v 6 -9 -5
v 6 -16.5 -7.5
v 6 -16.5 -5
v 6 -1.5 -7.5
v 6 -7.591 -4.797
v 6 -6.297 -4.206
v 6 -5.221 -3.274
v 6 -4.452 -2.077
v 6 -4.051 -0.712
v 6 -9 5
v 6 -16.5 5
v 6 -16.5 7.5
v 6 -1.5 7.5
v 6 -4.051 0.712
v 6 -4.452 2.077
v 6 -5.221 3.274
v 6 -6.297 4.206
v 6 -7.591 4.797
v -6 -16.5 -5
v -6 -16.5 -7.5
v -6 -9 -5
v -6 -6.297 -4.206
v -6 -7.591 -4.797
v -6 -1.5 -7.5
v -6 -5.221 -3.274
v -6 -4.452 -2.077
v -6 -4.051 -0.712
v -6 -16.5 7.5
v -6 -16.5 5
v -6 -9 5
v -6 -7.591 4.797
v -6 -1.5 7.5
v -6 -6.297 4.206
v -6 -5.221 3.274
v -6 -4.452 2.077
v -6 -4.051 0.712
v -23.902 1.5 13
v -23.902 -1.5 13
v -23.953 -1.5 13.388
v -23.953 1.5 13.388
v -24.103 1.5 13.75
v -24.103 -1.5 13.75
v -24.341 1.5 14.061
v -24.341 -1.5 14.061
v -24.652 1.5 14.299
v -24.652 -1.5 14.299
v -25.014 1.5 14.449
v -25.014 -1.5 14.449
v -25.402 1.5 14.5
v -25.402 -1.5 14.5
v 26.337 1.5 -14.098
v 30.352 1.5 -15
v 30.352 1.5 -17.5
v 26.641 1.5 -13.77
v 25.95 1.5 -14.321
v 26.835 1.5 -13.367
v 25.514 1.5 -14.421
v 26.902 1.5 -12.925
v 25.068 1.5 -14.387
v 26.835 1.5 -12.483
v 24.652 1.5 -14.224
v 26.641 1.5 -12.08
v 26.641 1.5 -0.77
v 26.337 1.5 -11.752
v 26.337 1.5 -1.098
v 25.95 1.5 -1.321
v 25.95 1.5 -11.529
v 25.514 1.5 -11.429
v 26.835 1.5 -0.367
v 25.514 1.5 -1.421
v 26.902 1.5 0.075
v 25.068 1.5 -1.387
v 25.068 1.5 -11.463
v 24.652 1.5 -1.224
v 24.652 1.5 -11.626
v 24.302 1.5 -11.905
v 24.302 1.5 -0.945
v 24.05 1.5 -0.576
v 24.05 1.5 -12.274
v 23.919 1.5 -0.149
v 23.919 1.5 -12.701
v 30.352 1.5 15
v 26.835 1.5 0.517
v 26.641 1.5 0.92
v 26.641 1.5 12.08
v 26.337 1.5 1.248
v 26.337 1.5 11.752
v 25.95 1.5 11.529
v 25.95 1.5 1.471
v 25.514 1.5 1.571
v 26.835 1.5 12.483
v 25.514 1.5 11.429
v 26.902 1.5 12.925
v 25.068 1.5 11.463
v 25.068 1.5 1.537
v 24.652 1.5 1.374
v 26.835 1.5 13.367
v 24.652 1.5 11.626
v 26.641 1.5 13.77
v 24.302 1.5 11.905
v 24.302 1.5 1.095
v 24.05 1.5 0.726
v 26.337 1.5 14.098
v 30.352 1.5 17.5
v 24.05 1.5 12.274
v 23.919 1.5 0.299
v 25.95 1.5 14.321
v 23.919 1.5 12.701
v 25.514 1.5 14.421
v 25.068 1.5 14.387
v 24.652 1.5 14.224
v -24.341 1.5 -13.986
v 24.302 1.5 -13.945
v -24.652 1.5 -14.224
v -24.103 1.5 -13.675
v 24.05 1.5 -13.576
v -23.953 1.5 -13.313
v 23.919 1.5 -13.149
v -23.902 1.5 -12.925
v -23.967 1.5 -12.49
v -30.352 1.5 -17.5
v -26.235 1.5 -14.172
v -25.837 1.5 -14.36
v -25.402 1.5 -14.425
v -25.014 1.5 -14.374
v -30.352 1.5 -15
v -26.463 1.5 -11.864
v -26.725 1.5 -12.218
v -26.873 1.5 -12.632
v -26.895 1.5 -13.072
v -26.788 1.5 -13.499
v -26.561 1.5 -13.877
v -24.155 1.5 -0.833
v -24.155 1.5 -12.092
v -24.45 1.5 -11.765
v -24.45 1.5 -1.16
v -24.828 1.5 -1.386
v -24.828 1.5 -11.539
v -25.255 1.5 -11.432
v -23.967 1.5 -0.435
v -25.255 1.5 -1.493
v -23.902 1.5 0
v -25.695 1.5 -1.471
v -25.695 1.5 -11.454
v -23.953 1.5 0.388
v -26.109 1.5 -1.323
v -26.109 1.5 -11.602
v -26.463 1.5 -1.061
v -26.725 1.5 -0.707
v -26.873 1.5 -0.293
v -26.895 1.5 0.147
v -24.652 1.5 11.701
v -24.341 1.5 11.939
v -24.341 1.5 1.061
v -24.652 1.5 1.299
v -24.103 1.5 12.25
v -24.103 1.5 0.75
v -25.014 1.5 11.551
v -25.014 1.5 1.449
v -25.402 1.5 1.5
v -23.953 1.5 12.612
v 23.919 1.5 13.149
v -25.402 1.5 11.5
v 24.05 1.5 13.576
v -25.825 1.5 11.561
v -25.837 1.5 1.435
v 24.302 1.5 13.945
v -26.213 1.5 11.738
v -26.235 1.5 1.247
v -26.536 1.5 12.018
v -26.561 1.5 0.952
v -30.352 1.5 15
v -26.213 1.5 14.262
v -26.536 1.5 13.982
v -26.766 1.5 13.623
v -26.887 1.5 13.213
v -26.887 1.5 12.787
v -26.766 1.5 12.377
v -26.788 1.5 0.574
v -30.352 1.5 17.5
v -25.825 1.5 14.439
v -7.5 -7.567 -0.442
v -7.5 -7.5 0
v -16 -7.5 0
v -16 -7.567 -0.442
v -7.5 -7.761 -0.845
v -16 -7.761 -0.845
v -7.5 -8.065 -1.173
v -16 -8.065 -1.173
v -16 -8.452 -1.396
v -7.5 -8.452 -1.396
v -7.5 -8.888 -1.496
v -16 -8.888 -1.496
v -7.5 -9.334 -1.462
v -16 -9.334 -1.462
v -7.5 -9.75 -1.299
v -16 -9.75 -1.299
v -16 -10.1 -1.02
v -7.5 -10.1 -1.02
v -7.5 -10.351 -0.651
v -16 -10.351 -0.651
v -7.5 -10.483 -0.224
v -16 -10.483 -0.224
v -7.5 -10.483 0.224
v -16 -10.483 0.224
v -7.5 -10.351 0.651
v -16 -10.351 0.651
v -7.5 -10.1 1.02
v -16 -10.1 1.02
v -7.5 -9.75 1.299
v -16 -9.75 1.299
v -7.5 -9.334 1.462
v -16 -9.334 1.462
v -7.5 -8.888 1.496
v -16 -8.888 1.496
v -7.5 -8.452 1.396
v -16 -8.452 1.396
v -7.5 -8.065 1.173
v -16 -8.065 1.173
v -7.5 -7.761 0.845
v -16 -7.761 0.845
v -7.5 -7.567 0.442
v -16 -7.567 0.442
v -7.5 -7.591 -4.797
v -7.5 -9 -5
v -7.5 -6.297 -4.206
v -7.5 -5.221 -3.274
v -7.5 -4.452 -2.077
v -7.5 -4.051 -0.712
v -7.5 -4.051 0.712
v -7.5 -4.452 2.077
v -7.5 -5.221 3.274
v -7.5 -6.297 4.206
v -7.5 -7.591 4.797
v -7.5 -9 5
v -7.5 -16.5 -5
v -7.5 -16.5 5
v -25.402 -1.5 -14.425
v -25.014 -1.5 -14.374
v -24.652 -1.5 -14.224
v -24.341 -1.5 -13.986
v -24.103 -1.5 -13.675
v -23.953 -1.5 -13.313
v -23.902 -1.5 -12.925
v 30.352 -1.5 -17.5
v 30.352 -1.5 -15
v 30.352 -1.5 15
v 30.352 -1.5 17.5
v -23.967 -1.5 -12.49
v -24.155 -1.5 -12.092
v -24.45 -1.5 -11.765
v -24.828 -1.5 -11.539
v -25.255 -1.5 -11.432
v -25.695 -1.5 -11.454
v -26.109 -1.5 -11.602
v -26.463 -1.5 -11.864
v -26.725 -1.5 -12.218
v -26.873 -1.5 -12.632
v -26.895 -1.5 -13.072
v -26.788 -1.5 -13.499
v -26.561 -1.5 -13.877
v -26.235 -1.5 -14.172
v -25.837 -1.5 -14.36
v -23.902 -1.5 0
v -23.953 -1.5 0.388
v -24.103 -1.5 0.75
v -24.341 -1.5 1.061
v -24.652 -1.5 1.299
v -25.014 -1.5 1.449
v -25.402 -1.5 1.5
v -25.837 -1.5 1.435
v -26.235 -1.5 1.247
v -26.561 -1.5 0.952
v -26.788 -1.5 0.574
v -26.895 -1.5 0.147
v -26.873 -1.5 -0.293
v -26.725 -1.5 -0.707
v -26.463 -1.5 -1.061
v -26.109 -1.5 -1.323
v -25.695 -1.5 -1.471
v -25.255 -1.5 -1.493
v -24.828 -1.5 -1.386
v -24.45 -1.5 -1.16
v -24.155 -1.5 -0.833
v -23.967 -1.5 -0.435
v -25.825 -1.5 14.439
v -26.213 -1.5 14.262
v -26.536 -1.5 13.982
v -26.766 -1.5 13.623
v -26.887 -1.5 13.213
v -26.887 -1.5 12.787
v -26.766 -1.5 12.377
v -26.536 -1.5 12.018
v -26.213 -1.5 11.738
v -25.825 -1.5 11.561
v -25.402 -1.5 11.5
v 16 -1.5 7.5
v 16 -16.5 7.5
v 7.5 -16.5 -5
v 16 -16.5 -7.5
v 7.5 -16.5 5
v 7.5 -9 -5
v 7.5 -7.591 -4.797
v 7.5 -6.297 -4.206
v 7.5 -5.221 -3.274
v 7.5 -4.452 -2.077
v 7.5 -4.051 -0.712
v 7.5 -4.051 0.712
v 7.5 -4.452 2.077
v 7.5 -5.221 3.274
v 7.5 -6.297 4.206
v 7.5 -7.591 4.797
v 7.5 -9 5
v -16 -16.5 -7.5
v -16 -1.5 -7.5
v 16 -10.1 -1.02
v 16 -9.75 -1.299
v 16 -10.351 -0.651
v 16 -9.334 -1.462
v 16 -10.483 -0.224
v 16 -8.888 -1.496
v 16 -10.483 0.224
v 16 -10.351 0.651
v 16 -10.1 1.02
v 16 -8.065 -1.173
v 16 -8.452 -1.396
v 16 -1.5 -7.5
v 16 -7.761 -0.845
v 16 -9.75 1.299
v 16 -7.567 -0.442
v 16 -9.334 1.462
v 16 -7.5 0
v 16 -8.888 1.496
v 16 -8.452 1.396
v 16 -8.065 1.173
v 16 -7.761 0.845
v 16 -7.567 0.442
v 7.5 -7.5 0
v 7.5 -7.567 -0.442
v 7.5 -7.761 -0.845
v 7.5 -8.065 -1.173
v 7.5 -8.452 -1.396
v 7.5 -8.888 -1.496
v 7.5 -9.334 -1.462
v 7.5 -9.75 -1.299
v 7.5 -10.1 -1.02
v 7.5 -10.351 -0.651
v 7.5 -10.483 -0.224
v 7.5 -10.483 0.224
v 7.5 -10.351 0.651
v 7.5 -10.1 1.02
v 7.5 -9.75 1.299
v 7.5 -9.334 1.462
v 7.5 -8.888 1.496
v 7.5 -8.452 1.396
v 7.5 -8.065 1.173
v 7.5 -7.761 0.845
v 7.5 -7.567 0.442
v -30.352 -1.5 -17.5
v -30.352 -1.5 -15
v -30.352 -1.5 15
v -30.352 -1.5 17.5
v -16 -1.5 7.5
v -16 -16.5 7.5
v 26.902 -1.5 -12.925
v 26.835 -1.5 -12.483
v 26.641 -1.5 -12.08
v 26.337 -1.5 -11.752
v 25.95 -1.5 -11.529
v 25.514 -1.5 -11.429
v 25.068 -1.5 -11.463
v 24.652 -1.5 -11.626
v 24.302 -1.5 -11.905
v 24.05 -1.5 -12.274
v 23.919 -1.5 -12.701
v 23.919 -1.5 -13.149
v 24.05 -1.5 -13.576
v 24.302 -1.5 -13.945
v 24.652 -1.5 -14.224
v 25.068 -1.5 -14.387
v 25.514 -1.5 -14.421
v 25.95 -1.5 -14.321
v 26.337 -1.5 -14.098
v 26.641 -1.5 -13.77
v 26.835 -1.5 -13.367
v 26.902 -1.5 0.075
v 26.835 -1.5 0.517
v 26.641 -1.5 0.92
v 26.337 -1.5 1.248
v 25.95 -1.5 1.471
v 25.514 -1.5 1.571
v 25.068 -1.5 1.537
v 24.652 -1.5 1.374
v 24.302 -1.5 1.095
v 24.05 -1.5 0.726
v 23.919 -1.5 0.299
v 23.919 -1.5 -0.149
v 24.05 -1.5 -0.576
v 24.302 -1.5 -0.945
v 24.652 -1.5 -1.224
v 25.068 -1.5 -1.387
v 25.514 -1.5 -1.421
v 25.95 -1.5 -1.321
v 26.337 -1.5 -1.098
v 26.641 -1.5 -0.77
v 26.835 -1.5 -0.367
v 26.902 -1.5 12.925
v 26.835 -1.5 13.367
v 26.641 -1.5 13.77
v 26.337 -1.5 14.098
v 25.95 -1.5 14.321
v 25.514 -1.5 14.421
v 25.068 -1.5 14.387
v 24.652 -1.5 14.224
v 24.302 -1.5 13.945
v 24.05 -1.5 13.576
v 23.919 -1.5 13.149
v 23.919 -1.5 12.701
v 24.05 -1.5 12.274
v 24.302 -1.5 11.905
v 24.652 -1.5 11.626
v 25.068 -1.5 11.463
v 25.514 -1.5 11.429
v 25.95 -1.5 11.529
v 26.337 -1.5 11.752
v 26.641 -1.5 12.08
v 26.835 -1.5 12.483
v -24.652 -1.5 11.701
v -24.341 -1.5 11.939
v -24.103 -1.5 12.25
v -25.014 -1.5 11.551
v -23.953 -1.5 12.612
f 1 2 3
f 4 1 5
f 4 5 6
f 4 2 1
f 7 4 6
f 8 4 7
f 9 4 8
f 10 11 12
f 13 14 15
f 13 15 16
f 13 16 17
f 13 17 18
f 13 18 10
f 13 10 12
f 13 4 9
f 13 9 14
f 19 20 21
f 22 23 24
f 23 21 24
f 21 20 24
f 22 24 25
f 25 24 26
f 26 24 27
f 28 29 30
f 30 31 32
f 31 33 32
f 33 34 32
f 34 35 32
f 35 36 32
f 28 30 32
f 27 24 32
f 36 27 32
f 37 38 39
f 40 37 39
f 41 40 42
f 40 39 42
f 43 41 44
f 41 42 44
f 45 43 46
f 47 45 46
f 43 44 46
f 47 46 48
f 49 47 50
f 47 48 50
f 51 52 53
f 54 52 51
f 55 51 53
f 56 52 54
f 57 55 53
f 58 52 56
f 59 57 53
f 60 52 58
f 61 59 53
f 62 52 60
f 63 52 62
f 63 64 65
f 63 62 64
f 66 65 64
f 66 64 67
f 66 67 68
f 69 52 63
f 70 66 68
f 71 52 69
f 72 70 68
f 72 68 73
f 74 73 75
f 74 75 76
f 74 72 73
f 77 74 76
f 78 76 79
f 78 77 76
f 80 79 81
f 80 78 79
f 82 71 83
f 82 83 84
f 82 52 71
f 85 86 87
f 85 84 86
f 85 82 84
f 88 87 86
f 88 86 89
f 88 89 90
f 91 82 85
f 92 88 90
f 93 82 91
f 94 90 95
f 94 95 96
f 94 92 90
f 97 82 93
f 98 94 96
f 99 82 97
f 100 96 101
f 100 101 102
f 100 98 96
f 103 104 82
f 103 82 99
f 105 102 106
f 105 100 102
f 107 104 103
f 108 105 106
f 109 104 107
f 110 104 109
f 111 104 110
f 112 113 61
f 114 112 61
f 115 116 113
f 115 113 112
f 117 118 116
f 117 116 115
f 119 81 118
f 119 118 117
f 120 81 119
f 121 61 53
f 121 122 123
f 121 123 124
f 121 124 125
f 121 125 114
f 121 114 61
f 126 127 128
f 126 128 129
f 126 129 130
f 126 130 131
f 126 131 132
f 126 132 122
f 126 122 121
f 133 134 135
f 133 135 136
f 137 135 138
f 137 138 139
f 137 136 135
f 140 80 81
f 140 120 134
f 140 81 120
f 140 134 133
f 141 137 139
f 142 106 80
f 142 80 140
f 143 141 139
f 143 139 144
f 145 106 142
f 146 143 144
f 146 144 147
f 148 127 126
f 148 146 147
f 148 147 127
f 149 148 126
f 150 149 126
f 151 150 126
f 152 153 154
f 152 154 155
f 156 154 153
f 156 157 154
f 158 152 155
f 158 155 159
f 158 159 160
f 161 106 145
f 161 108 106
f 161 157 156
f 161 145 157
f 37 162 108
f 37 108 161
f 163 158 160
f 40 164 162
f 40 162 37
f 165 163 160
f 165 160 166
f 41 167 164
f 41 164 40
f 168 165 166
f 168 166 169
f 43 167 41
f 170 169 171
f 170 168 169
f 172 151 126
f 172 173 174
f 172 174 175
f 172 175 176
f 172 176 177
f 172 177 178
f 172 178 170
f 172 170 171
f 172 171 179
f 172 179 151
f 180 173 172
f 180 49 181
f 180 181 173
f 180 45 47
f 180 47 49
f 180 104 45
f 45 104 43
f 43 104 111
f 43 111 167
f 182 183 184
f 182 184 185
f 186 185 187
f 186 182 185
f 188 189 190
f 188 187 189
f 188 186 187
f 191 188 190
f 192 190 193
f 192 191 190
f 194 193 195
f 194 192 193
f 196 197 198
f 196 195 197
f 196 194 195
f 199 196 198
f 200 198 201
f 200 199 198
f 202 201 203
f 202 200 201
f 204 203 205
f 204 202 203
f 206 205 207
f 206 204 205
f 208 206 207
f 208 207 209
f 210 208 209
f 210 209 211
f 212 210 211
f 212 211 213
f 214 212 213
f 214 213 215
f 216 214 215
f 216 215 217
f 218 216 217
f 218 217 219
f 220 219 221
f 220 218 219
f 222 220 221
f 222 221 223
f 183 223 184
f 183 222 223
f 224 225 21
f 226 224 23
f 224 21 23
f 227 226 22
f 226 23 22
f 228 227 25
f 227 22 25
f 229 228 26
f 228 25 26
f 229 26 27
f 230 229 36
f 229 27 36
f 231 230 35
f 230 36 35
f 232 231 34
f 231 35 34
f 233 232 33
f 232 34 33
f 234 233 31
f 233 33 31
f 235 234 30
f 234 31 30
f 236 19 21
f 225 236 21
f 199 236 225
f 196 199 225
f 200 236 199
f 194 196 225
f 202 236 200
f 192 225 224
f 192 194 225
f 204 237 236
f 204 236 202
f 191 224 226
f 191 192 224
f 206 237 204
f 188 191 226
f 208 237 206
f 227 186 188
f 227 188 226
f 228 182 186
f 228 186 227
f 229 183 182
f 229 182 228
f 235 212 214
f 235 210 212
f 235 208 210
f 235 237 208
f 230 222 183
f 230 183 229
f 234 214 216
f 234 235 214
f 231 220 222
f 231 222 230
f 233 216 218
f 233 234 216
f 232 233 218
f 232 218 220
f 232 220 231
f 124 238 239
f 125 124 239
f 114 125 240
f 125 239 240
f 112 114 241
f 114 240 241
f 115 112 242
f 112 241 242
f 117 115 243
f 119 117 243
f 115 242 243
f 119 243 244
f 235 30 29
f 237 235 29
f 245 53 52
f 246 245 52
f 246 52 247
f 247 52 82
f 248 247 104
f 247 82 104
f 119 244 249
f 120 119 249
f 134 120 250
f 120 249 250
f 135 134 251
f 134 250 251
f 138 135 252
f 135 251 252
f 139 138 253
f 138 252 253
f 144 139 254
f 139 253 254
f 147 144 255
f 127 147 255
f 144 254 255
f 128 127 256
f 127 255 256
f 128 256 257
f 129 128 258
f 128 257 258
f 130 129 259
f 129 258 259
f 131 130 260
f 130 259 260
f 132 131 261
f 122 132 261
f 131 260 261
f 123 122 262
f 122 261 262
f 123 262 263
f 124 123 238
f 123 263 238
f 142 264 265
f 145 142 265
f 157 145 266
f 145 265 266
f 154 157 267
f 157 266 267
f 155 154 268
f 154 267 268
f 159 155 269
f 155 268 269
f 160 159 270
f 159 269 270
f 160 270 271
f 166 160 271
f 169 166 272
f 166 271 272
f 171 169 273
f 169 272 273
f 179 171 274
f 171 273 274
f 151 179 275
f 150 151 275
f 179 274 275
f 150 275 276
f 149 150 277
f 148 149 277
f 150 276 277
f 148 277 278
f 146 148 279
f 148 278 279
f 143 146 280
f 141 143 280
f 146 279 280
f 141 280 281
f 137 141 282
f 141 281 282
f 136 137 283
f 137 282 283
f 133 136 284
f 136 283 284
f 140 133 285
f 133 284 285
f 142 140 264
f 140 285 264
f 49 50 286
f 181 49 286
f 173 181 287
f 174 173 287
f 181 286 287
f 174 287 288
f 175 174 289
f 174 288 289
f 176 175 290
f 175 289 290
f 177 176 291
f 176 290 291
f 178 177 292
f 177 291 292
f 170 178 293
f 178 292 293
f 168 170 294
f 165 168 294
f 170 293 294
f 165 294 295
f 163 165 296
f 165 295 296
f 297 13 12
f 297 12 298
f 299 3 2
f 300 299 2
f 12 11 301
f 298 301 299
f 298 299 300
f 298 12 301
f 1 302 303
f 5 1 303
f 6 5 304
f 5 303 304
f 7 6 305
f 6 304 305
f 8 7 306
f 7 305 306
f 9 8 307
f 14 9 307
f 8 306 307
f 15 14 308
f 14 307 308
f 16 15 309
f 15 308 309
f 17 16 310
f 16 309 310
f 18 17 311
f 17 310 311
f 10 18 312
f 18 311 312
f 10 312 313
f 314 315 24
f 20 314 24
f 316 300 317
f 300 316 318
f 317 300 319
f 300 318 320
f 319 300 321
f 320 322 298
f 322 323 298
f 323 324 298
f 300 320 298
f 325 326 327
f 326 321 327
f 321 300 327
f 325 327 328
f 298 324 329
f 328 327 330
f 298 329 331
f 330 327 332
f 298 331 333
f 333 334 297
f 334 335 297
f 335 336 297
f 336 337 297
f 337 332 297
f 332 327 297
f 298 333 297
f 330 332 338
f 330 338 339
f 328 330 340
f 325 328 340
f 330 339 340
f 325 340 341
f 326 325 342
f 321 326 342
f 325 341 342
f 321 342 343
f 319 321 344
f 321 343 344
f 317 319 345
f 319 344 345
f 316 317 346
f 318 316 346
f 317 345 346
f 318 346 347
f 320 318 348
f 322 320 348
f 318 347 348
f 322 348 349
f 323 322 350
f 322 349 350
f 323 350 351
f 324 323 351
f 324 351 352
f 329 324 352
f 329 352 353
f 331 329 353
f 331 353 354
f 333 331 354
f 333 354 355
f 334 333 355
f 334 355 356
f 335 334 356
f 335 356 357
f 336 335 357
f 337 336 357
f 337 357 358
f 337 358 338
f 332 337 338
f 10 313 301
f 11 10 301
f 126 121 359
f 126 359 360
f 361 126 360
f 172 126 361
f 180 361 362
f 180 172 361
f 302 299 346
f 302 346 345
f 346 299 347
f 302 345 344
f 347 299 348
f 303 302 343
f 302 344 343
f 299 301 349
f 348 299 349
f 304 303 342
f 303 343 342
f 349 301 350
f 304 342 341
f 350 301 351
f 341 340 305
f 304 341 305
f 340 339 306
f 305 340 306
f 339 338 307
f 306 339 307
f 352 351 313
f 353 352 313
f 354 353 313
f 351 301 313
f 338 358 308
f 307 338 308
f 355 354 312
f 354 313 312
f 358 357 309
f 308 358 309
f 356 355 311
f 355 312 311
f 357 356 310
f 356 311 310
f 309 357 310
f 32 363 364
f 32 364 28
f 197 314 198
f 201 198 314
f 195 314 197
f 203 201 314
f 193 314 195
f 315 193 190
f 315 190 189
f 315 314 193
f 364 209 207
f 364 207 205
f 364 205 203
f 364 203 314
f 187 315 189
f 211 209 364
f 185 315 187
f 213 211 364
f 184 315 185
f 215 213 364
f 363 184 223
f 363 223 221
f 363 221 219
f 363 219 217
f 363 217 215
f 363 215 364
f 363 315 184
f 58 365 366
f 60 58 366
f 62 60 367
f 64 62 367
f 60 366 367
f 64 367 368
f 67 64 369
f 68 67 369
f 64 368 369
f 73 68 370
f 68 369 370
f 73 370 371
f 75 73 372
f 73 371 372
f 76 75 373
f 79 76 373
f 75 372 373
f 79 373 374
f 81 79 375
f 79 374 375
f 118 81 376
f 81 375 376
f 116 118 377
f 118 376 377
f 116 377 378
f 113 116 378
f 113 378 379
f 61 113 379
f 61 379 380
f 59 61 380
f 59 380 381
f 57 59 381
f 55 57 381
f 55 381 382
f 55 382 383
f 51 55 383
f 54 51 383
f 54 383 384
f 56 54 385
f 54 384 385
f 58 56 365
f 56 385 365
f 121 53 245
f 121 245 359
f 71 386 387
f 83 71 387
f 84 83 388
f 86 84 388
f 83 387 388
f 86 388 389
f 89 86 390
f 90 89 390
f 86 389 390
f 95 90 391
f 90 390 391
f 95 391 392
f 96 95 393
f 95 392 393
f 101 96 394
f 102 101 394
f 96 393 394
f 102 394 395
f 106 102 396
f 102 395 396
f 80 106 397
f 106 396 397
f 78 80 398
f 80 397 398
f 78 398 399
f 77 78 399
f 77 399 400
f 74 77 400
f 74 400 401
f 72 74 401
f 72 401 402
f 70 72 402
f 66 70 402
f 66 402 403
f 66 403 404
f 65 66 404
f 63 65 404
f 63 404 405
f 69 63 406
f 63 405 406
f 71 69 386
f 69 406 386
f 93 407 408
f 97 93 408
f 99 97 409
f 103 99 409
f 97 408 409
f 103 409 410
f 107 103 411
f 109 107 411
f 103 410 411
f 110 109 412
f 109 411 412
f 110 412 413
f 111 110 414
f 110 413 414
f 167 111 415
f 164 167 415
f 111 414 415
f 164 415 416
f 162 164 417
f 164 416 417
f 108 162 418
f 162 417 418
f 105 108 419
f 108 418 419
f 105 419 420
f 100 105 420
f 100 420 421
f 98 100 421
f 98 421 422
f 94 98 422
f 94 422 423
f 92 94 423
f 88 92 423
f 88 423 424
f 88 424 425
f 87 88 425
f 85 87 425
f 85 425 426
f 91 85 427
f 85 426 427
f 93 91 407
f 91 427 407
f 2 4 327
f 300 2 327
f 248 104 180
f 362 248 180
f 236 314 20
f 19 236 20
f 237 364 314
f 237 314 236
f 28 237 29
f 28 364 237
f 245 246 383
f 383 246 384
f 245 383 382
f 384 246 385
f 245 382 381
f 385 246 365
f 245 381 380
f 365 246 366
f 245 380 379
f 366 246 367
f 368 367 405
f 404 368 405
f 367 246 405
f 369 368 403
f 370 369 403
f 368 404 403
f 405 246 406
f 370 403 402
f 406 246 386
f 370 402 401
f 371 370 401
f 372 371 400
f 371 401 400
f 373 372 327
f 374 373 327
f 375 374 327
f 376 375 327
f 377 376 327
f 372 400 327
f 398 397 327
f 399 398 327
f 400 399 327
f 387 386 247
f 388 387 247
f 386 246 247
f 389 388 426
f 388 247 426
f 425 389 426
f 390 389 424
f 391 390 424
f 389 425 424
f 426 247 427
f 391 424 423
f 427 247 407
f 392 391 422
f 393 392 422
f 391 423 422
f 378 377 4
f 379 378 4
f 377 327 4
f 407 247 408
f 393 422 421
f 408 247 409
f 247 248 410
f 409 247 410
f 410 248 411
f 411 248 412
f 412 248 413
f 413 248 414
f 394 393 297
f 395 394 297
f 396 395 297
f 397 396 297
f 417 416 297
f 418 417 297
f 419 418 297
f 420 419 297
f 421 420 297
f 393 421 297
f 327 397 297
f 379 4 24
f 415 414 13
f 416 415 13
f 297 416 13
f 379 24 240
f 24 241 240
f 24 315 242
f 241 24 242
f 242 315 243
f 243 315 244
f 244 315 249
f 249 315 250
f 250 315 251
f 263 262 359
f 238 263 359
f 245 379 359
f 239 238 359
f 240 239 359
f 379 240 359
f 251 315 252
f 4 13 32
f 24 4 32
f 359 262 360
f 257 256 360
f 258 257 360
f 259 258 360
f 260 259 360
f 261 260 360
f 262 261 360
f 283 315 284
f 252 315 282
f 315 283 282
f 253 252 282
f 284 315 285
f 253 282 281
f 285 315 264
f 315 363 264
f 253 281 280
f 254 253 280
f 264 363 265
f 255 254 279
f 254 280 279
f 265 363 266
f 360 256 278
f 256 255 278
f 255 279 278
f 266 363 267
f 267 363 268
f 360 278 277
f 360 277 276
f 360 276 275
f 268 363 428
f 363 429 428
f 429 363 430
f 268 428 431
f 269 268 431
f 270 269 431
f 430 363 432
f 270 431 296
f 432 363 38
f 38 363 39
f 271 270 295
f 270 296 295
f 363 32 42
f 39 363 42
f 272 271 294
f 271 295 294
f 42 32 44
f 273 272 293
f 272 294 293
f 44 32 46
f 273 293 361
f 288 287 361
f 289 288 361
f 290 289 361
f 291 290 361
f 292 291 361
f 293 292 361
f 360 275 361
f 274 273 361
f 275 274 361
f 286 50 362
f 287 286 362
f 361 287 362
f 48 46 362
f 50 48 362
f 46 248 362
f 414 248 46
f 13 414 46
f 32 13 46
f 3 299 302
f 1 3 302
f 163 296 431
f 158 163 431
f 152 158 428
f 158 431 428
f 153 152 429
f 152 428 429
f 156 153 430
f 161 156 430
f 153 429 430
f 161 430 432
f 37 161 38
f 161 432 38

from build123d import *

# Parameters (mm, degrees)
F0_W      = 60
F0_H      = 30
F1_DEPTH  = 1.5
F2_W      = 10
F2_H      = 15
F3_DEPTH  = 15
F2_R      = 1.5
F4_DEPTH  = 3
F5_R      = 5
F5_R_2    = 1.5
F6_DEPTH  = 7.5
F7_DEPTH  = 30
F9_DEPTH  = 7.5
F10_W     = 0.3519237886
F10_H     = 30
F10_H_2   = 2.075
F10_H_3   = 27.925
F11_DEPTH = 3
F12_W     = 60.7038475773
F12_H     = 2.5
F13_DEPTH = 3


with BuildPart() as f1:
    # F0 (on Front) → F1 (new body, symmetric)
    with BuildSketch(Plane.XZ):
        Rectangle(F0_W, F0_H)
    extrude(amount=F1_DEPTH, both=True)

    # F2 (on face) → F3 (join)
    with BuildSketch(Plane.XZ.offset(1.5)):
        with Locations((-11, 0)):
            Rectangle(F2_W, F2_H)
        with Locations((11, 0)):
            Rectangle(F2_W, F2_H)
    extrude(amount=F3_DEPTH)

    # F2 (on face) → F4 (cut)
    with BuildSketch(Plane.XZ.offset(1.5)):
        with BuildLine():
            Line((-25.4019237886, 13), (-25.4019237886, 14.5))
            ThreePointArc((-25.4019237886, 14.5), (-26.9019237886, 13), (-25.4019237886, 11.5))
            Line((-25.4019237886, 11.5), (-25.4019237886, 12.925))
            Line((-25.4019237886, 12.925), (-25.4019237886, 13))
        make_face()
        with BuildLine():
            ThreePointArc((-23.9019237886, 13), (-24.3412636169, 14.0606601718), (-25.4019237886, 14.5))
            Line((-25.4019237886, 14.5), (-25.4019237886, 13))
            Line((-25.4019237886, 13), (-25.4019237886, 12.925))
            Line((-25.4019237886, 12.925), (-25.4019237886, 11.5))
            ThreePointArc((-25.4019237886, 11.5), (-24.3412636169, 11.9393398282), (-23.9019237886, 13))
        make_face()
        with BuildLine():
            ThreePointArc((-23.9019237886, -12.925), (-26.4625839604, -11.8643398282), (-25.4019237886, -14.425))
            ThreePointArc((-25.4019237886, -14.425), (-24.3412636169, -13.9856601718), (-23.9019237886, -12.925))
        make_face()
        with Locations((25.4019237886, 12.925)):
            Circle(F2_R)
        with Locations((25.4019237886, -12.925)):
            Circle(F2_R)
        with BuildLine():
            ThreePointArc((-23.9019237886, 0), (-24.3412636169, 1.0606601718), (-25.4019237886, 1.5))
            ThreePointArc((-25.4019237886, 1.5), (-26.4625839604, -1.0606601718), (-23.9019237886, 0))
        make_face()
        with Locations((25.4019237886, 0.075)):
            Circle(F2_R)
    extrude(amount=-F4_DEPTH, mode=Mode.SUBTRACT)

    # F5 (on Right) → F6 (cut, symmetric)
    with BuildSketch(Plane.YZ):
        with Locations((-9, 0)):
            Circle(F5_R)
        with Locations((-9, 0)):
            Circle(F5_R_2, mode=Mode.SUBTRACT)
    extrude(amount=F6_DEPTH, both=True, mode=Mode.SUBTRACT)

    # F7 (cut, symmetric): a face of the model
    f7_faces = [f1.faces().sort_by_distance(p)[0] for p in [
        (-6, -9, 0),
    ]]
    extrude(f7_faces, amount=F7_DEPTH, both=True, mode=Mode.SUBTRACT)

    # F8 (on Right) → F9 (cut, symmetric)
    with BuildSketch(Plane.YZ):
        Polygon((-9, 5), (-16.5, 5), (-16.5, -5), (-9, -5), (-9, 0), align=None)
    extrude(amount=F9_DEPTH, both=True, mode=Mode.SUBTRACT)

    # F10 (on face) → F11 (join)
    with BuildSketch(Plane(origin=(0, 1.5, 0), x_dir=(-1, 0, 0), z_dir=(0, 1, 0))):
        with Locations((30.1759618943, 0)):
            Rectangle(F10_W, F10_H)
        with Locations((-30.1759618943, -13.9625)):
            Rectangle(F10_W, F10_H_2)
        with Locations((-30.1759618943, 1.0375)):
            Rectangle(F10_W, F10_H_3)
    extrude(amount=-F11_DEPTH)

    # F12 (on face) → F13 (join)
    with BuildSketch(Plane(origin=(0, 1.5, 0), x_dir=(-1, 0, 0), z_dir=(0, 1, 0))):
        with Locations((0, 16.25)):
            Rectangle(F12_W, F12_H)
        with Locations((0, -16.25)):
            Rectangle(F12_W, F12_H)
    extrude(amount=-F13_DEPTH)


solid = f1.part
